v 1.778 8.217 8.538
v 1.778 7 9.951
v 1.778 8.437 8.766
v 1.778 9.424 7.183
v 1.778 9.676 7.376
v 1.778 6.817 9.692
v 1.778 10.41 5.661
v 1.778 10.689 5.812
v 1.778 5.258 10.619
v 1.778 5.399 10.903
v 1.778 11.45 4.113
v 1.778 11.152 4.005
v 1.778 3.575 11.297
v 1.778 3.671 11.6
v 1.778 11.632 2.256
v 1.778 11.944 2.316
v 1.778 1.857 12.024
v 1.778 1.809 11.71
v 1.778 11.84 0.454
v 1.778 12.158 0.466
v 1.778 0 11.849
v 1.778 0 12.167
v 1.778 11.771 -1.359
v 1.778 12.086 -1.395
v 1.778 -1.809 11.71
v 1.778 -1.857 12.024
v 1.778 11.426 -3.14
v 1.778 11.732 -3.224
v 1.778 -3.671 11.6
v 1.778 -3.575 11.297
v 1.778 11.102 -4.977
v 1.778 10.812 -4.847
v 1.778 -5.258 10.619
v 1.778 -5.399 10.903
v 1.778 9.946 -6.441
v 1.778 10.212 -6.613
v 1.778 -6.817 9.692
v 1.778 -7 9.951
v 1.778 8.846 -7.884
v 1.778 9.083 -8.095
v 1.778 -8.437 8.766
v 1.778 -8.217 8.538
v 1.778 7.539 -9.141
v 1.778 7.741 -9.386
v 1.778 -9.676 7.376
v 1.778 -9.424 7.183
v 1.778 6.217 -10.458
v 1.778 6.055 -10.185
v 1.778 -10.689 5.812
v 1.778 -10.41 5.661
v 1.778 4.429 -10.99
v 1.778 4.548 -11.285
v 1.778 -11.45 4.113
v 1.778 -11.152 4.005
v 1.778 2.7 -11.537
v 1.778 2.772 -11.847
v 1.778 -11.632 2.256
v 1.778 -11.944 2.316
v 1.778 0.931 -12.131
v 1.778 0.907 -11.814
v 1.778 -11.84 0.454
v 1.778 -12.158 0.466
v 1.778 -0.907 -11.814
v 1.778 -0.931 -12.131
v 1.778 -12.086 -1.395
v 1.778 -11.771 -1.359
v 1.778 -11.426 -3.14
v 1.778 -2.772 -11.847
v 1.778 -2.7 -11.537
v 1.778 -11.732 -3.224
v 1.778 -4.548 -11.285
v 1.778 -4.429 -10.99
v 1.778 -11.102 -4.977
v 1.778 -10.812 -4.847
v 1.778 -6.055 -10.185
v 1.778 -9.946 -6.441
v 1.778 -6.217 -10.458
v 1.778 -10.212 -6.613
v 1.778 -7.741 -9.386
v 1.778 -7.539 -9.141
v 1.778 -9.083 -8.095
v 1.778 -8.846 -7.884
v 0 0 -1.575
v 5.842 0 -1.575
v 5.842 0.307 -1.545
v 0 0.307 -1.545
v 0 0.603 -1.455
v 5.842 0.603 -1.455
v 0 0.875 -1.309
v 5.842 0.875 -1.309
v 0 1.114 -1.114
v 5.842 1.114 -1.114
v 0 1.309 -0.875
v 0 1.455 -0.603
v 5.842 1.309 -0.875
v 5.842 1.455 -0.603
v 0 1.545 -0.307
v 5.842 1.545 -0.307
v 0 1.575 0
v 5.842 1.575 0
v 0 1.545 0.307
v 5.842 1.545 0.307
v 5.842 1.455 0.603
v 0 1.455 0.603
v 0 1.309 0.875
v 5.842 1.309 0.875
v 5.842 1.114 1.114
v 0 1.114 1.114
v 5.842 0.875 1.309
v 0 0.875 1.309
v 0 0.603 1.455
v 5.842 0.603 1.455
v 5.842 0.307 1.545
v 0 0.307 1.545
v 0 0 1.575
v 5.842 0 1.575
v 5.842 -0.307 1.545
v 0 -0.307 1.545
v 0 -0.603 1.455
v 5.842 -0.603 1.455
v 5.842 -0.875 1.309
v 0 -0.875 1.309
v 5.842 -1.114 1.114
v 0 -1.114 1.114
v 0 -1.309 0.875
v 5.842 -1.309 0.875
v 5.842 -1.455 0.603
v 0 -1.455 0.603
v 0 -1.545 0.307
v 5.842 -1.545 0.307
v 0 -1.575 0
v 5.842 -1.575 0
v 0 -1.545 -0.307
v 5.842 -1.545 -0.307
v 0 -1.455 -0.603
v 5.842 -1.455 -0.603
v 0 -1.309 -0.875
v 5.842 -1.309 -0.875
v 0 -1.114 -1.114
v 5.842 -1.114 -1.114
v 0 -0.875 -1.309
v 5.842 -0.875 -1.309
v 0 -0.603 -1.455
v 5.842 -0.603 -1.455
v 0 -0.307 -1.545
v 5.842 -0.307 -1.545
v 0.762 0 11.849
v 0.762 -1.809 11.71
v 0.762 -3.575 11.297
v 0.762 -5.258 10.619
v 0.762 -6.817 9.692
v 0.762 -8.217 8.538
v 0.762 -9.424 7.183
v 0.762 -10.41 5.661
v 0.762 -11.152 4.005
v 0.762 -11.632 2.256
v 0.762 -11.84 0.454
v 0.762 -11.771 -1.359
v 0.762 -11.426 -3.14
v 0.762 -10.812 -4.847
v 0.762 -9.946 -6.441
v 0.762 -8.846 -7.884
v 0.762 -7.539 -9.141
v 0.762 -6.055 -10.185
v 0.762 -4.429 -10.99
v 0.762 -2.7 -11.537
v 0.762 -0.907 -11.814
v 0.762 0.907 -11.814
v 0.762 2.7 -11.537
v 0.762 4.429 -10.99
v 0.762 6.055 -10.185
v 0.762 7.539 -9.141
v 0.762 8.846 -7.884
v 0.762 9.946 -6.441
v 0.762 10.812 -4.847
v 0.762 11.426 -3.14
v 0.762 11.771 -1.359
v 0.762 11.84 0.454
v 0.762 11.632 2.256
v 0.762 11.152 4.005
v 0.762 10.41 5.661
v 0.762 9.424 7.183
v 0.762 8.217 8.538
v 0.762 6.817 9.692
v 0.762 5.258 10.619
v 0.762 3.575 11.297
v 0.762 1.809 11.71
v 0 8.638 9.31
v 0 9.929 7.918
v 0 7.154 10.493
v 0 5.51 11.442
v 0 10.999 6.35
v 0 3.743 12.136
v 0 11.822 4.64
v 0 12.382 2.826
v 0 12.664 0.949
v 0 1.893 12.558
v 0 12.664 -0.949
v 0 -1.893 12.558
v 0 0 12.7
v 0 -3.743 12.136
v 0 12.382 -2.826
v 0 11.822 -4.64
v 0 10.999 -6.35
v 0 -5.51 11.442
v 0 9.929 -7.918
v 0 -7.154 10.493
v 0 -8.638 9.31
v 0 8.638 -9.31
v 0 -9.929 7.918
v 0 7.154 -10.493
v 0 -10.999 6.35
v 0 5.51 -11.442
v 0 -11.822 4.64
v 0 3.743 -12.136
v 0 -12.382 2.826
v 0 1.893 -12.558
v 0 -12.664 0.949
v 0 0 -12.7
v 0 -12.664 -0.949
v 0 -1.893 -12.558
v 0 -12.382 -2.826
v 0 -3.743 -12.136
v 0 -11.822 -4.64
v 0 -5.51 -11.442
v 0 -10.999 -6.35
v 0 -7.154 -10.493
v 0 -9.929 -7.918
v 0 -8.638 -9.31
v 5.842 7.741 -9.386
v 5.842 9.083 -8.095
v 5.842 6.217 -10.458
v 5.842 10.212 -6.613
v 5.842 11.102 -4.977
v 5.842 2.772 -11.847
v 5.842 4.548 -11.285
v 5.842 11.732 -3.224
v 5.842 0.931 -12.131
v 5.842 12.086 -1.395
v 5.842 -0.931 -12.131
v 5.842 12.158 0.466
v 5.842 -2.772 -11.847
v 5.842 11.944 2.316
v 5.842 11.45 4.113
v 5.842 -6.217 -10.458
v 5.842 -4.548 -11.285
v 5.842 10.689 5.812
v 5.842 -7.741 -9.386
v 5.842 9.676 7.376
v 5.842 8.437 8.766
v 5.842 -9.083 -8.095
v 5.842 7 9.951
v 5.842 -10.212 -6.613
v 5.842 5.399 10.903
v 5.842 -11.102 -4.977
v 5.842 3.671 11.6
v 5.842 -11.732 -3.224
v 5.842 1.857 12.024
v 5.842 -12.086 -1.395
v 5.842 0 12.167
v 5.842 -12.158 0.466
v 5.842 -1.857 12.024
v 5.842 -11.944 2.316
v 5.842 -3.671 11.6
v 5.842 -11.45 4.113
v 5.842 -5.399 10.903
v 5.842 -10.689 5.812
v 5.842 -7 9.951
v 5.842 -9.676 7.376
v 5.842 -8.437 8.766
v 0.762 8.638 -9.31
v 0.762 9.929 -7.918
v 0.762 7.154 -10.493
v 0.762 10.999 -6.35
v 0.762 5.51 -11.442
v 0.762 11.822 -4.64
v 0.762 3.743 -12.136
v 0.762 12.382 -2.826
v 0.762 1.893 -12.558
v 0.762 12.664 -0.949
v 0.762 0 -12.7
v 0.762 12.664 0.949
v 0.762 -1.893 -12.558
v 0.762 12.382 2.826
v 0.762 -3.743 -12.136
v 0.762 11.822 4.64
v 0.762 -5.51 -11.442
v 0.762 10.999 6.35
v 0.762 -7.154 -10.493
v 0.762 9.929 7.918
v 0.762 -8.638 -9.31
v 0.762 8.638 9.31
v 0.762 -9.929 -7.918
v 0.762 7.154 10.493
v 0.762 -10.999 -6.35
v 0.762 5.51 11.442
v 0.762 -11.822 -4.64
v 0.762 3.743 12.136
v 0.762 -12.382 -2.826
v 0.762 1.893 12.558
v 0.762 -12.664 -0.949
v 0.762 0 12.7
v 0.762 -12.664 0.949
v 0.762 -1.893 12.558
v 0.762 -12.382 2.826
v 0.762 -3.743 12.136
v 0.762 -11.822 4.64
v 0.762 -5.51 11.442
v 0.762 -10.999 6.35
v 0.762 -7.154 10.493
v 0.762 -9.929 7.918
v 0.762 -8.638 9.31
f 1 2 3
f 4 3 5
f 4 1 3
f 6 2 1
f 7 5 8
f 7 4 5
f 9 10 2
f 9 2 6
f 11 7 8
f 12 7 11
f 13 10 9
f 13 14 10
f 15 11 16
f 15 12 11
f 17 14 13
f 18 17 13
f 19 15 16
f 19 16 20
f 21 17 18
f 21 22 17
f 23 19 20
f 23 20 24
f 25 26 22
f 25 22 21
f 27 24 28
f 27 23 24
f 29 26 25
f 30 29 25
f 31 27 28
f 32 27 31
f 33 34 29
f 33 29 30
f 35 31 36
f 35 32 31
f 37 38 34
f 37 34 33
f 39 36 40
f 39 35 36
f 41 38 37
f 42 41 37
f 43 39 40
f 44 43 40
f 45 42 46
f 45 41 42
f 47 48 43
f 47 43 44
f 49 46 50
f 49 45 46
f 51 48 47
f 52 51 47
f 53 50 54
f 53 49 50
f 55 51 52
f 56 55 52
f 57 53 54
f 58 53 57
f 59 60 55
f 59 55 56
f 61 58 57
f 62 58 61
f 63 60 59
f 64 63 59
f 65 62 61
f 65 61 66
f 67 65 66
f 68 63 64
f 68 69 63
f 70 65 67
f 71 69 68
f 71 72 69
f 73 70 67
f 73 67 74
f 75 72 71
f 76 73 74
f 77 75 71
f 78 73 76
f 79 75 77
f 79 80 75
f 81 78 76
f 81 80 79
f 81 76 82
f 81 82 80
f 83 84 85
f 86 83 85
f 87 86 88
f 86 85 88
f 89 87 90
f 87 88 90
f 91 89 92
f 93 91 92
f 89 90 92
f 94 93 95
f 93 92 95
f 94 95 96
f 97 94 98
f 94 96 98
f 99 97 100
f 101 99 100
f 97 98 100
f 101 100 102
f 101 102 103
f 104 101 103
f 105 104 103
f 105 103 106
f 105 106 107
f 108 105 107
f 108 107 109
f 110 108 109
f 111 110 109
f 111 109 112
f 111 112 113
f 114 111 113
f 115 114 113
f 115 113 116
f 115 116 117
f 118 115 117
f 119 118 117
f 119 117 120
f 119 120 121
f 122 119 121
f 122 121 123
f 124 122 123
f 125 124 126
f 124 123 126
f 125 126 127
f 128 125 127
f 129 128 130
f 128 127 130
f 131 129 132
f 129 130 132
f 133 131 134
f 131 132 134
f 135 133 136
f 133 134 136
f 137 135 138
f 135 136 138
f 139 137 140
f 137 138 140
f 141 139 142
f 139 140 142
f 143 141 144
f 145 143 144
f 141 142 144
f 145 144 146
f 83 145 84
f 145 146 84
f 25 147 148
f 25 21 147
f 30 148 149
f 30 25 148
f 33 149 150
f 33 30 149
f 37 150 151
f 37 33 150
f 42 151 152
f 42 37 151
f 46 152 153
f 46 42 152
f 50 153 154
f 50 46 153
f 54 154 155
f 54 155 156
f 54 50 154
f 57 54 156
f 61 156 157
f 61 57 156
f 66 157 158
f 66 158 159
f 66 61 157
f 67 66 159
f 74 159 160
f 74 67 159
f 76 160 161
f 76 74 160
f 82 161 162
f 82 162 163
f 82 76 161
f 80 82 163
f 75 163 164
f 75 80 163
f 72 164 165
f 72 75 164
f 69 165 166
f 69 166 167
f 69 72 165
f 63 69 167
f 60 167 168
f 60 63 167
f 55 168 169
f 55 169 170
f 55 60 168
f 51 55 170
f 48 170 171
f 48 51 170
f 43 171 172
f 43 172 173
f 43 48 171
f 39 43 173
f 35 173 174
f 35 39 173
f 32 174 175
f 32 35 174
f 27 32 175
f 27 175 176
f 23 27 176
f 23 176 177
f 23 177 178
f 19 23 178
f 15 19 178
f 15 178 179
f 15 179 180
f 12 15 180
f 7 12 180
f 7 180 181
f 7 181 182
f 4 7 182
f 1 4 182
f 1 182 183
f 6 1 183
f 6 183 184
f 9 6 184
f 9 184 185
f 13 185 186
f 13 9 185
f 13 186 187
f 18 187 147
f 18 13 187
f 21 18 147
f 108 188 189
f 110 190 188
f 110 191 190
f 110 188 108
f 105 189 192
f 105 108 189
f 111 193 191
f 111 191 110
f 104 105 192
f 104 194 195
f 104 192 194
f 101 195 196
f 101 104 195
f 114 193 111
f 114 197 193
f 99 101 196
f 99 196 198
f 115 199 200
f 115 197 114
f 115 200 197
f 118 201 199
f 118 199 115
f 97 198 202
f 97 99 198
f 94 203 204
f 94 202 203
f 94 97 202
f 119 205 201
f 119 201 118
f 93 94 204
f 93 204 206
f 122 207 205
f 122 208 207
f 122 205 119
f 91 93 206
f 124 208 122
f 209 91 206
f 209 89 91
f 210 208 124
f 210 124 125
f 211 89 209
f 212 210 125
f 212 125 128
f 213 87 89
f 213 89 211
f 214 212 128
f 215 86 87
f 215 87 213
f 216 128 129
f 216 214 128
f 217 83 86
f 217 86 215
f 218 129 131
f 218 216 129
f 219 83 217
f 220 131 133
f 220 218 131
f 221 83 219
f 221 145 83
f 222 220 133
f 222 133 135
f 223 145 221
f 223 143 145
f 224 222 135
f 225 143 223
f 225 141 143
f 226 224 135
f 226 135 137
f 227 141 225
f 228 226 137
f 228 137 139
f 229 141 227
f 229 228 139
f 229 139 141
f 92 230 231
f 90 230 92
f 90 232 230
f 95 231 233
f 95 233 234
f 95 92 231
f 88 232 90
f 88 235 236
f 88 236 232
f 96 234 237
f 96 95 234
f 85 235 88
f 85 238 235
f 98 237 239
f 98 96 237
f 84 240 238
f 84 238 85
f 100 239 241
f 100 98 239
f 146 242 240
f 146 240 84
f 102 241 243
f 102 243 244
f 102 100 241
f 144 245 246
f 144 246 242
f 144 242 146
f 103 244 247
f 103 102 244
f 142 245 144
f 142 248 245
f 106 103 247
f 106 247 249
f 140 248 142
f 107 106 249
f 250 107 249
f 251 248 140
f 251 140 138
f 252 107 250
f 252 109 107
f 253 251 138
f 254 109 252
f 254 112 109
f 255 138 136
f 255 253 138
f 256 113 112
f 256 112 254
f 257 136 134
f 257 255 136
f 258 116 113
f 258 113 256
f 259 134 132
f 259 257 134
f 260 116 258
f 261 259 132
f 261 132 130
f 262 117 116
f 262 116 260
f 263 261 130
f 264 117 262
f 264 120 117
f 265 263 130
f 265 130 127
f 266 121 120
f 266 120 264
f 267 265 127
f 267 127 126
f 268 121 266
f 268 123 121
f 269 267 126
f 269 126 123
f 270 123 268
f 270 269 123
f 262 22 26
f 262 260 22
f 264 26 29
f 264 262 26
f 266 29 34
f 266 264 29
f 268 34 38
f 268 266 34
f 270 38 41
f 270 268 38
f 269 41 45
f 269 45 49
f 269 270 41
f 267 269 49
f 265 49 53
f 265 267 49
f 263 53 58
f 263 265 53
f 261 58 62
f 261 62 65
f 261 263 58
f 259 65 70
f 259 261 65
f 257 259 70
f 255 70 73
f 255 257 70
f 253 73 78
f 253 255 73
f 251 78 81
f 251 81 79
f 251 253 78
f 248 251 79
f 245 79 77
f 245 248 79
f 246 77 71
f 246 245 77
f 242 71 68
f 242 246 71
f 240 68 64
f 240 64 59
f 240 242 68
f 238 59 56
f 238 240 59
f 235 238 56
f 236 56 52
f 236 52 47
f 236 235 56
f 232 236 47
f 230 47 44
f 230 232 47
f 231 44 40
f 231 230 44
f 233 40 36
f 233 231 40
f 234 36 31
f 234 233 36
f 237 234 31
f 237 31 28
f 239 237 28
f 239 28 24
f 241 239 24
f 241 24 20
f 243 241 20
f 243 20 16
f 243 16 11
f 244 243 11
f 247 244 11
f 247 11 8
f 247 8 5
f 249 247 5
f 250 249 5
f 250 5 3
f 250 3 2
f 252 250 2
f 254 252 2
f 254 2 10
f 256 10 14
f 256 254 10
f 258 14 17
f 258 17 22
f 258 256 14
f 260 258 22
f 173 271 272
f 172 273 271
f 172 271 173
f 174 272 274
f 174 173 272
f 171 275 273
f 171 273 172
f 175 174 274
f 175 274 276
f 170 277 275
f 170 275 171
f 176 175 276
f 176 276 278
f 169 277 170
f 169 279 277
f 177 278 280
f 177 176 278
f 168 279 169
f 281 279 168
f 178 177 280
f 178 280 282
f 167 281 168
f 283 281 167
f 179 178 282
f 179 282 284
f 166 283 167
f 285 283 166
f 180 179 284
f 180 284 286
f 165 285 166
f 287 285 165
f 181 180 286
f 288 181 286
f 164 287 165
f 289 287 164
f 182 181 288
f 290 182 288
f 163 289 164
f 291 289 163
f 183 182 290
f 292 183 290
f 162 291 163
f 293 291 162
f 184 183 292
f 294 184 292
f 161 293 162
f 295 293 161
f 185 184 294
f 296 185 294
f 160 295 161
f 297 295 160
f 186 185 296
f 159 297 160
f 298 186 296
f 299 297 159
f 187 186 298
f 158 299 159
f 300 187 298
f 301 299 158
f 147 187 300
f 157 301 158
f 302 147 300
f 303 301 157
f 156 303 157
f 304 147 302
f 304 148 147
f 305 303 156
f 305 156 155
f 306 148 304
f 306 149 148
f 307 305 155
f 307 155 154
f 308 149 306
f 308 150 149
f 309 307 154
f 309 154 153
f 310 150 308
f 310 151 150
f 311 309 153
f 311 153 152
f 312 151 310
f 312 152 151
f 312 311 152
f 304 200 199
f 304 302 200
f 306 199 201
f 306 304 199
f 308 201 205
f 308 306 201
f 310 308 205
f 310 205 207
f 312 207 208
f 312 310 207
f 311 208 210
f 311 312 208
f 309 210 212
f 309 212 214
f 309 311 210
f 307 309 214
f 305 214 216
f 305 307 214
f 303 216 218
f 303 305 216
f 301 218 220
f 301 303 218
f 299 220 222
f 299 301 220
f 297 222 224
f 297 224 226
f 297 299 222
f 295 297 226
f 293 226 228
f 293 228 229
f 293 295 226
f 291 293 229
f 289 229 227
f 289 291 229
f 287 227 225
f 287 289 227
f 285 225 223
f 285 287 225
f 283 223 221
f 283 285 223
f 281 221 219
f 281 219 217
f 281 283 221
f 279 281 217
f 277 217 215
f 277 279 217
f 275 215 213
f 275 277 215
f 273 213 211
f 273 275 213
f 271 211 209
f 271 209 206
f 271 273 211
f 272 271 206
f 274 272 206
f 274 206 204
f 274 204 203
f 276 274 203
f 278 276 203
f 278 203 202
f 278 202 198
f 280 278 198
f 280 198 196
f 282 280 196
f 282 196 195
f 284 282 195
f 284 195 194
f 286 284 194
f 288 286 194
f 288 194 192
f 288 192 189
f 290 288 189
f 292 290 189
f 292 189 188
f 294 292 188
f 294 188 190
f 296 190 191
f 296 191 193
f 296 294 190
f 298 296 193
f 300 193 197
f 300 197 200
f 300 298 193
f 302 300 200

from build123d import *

# Parameters (mm, degrees)
SKETCH3_R          = 1.5748
CUT_EXTRUDE1_DEPTH = 19.886740428


with BuildPart() as part:
    # Sketch2 → Revolve1 (revolve)
    with BuildSketch(Plane.XY, mode=Mode.PRIVATE) as revolve1_sk:
        Polygon((0, 0), (0, -12.7), (0.762, -12.7), (0.762, -11.8491), (1.778, -11.8491), (1.778, -12.1666), (5.842, -12.1666), (5.842, 0), align=None)
    revolve(revolve1_sk.sketch.rotate(Axis((0, 0, 0), (1, 0, 0)), 270), axis=Axis((0, 0, 0), (1, 0, 0)))

    # Sketch3 → Cut-Extrude1 (cut, through all)
    with BuildSketch(Plane(origin=(5.842, 0, 0), x_dir=(0, 0, -1), z_dir=(1, 0, 0))):
        Circle(SKETCH3_R)
    extrude(amount=-CUT_EXTRUDE1_DEPTH, mode=Mode.SUBTRACT)


solid = part.part
